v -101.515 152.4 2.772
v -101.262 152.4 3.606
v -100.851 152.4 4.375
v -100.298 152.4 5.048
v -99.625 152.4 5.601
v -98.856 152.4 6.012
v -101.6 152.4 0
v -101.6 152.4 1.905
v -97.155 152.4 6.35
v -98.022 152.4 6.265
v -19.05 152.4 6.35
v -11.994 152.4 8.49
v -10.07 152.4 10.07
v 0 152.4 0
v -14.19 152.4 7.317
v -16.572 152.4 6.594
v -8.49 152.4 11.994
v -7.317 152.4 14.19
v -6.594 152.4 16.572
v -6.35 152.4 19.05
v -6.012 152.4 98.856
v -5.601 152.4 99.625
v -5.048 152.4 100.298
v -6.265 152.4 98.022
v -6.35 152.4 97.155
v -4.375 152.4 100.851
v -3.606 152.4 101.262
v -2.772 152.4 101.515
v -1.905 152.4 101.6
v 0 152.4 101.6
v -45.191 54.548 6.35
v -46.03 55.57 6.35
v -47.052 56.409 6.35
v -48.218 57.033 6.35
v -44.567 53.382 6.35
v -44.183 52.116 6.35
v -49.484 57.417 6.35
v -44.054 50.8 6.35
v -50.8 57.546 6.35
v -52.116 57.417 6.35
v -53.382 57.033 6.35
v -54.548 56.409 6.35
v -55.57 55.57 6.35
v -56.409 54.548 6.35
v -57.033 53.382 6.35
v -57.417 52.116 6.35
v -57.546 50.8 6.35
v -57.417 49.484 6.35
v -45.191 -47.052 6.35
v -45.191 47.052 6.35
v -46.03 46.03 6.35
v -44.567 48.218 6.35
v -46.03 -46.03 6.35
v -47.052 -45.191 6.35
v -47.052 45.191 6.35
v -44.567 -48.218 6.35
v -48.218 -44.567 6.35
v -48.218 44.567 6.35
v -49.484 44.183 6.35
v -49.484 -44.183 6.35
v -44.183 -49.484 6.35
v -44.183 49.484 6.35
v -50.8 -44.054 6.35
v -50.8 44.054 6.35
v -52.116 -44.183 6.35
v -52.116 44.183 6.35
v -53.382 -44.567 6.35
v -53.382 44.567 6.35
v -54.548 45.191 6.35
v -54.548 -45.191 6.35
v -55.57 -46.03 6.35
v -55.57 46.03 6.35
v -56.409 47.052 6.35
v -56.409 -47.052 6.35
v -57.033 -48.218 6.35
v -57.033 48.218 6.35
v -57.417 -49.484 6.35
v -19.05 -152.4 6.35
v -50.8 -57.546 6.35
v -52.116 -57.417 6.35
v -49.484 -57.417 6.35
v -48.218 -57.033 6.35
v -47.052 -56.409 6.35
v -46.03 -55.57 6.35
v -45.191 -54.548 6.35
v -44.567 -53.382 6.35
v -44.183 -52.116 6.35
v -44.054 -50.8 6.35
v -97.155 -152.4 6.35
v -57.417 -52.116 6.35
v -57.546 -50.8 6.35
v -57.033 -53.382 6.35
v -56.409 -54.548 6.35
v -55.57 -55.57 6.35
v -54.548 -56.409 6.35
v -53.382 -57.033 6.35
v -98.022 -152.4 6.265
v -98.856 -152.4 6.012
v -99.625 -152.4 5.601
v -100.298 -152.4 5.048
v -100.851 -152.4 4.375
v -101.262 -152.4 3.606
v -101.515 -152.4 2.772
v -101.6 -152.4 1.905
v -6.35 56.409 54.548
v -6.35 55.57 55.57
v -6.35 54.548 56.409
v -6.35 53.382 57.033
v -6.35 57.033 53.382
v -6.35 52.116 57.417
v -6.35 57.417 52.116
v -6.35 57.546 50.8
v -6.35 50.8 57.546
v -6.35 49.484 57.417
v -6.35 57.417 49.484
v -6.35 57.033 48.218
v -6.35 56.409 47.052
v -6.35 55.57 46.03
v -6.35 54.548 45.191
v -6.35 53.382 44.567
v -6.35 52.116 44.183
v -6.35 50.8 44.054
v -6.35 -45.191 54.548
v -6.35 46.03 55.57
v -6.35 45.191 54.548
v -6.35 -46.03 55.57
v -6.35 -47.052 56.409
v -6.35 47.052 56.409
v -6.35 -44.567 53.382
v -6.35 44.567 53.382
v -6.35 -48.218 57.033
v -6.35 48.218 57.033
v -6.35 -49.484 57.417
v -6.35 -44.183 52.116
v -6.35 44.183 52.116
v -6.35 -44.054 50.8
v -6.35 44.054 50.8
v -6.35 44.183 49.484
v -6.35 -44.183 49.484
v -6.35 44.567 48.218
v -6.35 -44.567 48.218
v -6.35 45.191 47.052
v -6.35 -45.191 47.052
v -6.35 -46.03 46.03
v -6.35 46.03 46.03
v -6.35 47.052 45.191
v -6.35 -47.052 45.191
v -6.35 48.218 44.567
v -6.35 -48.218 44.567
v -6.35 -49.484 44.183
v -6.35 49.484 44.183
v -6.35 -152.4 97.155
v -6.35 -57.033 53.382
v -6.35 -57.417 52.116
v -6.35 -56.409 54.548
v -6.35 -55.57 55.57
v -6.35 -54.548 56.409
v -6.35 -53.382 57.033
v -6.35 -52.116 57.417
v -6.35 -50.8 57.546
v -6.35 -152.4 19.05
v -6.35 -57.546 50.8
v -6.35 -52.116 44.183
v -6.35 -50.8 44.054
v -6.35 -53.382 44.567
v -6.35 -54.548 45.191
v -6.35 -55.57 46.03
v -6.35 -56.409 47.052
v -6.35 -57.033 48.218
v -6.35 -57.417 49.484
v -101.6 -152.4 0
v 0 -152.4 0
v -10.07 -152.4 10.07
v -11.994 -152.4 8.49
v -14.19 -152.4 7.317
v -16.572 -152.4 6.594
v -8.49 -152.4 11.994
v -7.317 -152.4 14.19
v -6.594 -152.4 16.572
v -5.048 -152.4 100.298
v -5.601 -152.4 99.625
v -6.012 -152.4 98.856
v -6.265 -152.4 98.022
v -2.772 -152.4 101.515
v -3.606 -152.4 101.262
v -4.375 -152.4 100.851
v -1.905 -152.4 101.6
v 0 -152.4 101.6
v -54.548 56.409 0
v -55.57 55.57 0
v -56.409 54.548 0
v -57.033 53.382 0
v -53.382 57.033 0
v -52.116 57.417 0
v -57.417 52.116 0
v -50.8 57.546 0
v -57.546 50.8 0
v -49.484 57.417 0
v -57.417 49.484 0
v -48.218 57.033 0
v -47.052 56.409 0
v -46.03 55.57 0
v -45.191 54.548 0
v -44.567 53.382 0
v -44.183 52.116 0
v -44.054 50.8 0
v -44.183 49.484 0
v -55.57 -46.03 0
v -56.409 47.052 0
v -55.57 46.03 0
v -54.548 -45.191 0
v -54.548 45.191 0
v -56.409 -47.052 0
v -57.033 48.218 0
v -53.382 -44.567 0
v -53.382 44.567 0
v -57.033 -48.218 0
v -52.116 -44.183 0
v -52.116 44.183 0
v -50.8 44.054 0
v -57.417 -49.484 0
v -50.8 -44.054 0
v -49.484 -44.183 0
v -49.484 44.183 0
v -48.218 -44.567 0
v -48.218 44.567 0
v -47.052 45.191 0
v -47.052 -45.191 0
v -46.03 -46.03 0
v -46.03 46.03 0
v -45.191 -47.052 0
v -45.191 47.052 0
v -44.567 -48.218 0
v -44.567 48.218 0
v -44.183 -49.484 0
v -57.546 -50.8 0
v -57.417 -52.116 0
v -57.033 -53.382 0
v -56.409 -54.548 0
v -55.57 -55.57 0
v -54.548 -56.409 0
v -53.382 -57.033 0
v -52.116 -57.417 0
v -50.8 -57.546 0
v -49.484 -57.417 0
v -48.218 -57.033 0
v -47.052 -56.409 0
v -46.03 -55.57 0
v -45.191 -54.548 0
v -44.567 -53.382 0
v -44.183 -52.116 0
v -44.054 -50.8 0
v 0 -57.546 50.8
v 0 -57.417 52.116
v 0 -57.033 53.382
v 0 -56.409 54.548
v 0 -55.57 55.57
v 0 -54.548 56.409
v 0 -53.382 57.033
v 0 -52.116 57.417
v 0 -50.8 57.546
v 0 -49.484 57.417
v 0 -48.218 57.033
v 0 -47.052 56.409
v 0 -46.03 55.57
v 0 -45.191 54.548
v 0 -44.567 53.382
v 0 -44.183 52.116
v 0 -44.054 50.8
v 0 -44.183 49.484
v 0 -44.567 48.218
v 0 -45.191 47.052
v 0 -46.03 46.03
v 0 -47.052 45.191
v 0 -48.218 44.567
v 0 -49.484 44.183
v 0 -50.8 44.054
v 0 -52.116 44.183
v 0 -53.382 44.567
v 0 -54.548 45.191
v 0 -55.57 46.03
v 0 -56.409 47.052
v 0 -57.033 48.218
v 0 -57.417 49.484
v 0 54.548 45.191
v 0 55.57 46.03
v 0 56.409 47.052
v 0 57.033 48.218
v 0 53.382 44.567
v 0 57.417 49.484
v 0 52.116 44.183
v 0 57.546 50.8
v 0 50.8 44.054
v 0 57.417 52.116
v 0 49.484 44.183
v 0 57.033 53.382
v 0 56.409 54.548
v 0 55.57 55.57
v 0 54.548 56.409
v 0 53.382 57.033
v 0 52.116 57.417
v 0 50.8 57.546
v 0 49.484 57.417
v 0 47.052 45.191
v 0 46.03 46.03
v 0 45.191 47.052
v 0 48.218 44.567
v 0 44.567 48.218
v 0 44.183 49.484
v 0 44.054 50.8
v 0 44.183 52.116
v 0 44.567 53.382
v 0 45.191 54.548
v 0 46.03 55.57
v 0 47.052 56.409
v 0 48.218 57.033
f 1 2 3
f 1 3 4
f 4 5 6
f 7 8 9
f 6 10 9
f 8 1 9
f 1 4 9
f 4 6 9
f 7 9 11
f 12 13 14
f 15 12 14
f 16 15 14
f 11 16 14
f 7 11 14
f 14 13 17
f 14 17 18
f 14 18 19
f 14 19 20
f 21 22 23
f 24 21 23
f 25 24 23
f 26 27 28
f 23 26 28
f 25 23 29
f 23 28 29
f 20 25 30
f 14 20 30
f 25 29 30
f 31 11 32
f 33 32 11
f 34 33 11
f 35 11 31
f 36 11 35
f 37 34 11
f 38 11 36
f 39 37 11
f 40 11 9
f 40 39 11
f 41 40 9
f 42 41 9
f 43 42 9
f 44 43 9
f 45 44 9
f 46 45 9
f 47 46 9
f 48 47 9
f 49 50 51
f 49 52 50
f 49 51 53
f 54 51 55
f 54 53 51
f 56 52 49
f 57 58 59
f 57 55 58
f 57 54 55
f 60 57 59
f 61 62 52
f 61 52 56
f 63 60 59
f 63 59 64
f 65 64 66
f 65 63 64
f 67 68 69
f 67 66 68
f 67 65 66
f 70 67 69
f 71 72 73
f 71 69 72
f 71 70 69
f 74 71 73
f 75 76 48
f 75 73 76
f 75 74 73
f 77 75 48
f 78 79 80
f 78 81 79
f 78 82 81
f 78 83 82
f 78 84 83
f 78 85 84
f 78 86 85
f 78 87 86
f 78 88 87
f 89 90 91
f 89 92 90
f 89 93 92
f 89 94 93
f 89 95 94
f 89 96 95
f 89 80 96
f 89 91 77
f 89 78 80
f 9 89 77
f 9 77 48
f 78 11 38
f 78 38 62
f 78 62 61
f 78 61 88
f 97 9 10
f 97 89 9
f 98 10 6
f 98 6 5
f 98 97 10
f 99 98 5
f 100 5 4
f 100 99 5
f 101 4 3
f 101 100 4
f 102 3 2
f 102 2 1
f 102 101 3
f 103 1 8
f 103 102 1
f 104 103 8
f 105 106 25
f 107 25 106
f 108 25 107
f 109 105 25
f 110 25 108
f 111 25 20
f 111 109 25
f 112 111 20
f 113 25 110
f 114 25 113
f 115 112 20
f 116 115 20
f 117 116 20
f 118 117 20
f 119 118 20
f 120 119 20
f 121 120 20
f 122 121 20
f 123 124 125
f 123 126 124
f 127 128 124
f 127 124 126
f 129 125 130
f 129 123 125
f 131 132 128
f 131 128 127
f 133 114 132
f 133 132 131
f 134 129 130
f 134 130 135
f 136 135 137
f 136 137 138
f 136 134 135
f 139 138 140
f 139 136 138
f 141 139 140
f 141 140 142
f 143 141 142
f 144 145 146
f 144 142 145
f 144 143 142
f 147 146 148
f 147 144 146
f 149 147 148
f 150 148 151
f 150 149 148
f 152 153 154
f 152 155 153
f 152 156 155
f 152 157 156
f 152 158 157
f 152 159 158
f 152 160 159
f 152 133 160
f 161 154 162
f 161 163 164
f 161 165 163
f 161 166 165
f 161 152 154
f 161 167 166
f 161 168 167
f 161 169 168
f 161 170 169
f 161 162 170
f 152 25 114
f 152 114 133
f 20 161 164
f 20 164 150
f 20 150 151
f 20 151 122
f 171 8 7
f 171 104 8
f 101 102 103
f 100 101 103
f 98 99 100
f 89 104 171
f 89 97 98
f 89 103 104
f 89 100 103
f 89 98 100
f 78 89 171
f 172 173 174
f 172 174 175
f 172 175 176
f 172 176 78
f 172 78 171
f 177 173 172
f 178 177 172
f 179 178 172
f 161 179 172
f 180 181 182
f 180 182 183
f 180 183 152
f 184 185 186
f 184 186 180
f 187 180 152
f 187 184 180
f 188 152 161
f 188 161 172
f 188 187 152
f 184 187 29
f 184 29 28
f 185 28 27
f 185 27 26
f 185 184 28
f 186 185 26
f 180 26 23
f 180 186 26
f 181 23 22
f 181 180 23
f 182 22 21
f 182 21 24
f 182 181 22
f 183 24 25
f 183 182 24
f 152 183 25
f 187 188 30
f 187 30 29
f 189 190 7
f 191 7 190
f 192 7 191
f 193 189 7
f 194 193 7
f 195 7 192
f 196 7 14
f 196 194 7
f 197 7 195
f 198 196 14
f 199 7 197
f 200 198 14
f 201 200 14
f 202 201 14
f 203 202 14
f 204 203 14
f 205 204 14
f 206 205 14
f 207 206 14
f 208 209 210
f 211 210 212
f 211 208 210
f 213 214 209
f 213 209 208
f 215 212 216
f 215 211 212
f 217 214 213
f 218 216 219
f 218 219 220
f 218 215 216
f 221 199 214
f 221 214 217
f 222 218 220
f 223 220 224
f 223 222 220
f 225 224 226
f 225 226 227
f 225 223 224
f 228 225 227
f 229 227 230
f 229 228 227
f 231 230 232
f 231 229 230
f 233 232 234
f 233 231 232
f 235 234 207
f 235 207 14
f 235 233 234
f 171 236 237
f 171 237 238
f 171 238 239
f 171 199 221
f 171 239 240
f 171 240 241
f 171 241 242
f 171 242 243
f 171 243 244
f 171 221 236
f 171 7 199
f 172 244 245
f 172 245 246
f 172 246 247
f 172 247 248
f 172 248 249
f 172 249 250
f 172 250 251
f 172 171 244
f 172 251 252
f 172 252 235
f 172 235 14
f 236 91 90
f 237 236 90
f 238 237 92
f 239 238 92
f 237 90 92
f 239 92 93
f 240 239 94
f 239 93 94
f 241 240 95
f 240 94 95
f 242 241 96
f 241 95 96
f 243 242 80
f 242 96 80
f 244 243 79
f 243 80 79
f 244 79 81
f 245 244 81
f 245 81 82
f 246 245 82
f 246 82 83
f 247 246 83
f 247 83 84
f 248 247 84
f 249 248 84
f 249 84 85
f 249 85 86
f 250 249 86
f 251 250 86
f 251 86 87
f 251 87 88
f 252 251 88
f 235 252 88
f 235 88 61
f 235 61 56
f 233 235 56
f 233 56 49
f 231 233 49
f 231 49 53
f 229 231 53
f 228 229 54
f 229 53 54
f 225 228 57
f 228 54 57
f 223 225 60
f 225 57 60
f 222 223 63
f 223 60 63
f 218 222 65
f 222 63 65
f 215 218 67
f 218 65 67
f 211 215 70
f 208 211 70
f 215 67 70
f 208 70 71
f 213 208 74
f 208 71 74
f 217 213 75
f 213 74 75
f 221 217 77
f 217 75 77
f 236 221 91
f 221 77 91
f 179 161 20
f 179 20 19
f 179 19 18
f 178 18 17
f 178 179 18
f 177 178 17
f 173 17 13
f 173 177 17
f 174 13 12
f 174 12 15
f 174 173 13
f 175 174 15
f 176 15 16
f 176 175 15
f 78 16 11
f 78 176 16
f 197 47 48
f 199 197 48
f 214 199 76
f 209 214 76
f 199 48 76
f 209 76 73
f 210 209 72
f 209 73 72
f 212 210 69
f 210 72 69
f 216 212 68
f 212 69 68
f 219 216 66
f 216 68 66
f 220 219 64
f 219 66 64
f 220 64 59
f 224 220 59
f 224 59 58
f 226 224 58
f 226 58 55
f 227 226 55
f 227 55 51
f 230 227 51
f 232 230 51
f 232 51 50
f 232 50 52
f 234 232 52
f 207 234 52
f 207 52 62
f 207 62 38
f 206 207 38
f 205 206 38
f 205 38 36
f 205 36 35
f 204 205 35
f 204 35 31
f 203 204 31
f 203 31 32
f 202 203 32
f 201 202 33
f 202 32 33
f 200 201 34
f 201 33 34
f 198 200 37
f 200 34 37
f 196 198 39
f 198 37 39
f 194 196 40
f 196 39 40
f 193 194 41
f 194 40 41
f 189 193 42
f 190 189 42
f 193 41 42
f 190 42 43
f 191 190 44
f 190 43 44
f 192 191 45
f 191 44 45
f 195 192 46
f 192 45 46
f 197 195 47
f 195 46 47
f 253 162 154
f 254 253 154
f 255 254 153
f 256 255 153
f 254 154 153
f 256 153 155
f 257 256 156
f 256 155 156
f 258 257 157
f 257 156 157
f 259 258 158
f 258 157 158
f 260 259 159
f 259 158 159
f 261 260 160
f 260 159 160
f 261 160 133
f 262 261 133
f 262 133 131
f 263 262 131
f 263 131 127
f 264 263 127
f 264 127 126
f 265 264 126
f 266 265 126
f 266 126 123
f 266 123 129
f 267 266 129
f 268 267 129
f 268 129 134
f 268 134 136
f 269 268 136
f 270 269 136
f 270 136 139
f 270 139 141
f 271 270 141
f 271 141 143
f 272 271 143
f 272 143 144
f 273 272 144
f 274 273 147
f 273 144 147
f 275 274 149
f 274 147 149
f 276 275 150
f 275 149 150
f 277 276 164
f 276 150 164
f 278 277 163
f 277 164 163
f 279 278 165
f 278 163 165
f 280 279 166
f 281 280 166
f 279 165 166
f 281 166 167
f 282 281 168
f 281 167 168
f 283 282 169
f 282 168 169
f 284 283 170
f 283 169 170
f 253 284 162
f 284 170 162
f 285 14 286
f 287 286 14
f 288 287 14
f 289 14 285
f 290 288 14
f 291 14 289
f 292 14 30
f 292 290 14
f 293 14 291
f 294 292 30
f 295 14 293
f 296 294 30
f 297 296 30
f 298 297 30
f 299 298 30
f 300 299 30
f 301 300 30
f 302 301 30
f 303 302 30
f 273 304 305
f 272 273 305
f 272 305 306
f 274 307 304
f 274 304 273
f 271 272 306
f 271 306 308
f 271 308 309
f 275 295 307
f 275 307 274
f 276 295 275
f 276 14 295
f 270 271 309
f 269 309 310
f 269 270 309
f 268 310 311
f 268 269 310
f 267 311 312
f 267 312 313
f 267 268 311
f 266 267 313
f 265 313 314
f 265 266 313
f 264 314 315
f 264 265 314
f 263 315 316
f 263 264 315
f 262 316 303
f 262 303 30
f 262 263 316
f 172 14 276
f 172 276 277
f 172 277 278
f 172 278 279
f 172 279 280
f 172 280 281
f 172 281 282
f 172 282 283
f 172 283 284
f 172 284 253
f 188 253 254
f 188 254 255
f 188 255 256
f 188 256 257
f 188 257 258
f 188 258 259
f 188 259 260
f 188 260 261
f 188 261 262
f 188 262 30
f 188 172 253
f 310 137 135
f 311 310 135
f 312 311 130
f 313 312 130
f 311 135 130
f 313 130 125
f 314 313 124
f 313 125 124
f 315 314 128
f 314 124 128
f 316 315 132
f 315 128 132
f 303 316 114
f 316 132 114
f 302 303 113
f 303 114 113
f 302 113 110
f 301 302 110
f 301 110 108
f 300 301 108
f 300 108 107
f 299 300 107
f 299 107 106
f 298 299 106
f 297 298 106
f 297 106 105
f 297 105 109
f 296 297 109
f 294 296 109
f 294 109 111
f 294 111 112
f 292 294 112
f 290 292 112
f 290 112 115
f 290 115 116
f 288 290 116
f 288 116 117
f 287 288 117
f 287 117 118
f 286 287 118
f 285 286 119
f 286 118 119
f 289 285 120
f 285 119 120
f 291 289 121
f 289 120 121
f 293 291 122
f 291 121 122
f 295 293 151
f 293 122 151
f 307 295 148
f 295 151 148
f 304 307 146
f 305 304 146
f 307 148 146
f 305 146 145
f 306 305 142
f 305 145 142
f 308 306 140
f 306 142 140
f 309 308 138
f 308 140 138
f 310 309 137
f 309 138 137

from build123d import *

# Parameters (mm, degrees)
F1_DEPTH   = 152.4
F4_D       = 13.49248
F4_ON_F2_D = 13.49248


with BuildPart() as f1:
    # F0 (on Front) → F1 (new body, symmetric)
    with BuildSketch(Plane.XZ):
        with BuildLine():
            Line((-101.6, 1.905), (-101.6, 0))
            Line((-101.6, 0), (0, 0))
            Line((0, 0), (0, 101.6))
            Line((0, 101.6), (-1.905, 101.6))
            ThreePointArc((-1.905, 101.6), (-5.0480896424, 100.2980896424), (-6.35, 97.155))
            Line((-6.35, 97.155), (-6.35, 19.05))
            ThreePointArc((-6.35, 19.05), (-10.0697438789, 10.0697438789), (-19.05, 6.35))
            Line((-19.05, 6.35), (-97.155, 6.35))
            ThreePointArc((-97.155, 6.35), (-100.2980896424, 5.0480896424), (-101.6, 1.905))
        make_face()
    extrude(amount=F1_DEPTH, both=True)

    # F4 (through all)
    with Locations(Plane.YZ):
        with Locations((-50.8, 50.8), (50.8, 50.8)):
            Hole(F4_D / 2)

    # F4 on F2 (through all)
    with Locations(Plane(origin=(0, 0, 0), x_dir=(1, 0, 0), z_dir=(0, 0, -1))):
        with Locations((-50.8, 50.8), (-50.8, -50.8)):
            Hole(F4_ON_F2_D / 2)


solid = f1.part
